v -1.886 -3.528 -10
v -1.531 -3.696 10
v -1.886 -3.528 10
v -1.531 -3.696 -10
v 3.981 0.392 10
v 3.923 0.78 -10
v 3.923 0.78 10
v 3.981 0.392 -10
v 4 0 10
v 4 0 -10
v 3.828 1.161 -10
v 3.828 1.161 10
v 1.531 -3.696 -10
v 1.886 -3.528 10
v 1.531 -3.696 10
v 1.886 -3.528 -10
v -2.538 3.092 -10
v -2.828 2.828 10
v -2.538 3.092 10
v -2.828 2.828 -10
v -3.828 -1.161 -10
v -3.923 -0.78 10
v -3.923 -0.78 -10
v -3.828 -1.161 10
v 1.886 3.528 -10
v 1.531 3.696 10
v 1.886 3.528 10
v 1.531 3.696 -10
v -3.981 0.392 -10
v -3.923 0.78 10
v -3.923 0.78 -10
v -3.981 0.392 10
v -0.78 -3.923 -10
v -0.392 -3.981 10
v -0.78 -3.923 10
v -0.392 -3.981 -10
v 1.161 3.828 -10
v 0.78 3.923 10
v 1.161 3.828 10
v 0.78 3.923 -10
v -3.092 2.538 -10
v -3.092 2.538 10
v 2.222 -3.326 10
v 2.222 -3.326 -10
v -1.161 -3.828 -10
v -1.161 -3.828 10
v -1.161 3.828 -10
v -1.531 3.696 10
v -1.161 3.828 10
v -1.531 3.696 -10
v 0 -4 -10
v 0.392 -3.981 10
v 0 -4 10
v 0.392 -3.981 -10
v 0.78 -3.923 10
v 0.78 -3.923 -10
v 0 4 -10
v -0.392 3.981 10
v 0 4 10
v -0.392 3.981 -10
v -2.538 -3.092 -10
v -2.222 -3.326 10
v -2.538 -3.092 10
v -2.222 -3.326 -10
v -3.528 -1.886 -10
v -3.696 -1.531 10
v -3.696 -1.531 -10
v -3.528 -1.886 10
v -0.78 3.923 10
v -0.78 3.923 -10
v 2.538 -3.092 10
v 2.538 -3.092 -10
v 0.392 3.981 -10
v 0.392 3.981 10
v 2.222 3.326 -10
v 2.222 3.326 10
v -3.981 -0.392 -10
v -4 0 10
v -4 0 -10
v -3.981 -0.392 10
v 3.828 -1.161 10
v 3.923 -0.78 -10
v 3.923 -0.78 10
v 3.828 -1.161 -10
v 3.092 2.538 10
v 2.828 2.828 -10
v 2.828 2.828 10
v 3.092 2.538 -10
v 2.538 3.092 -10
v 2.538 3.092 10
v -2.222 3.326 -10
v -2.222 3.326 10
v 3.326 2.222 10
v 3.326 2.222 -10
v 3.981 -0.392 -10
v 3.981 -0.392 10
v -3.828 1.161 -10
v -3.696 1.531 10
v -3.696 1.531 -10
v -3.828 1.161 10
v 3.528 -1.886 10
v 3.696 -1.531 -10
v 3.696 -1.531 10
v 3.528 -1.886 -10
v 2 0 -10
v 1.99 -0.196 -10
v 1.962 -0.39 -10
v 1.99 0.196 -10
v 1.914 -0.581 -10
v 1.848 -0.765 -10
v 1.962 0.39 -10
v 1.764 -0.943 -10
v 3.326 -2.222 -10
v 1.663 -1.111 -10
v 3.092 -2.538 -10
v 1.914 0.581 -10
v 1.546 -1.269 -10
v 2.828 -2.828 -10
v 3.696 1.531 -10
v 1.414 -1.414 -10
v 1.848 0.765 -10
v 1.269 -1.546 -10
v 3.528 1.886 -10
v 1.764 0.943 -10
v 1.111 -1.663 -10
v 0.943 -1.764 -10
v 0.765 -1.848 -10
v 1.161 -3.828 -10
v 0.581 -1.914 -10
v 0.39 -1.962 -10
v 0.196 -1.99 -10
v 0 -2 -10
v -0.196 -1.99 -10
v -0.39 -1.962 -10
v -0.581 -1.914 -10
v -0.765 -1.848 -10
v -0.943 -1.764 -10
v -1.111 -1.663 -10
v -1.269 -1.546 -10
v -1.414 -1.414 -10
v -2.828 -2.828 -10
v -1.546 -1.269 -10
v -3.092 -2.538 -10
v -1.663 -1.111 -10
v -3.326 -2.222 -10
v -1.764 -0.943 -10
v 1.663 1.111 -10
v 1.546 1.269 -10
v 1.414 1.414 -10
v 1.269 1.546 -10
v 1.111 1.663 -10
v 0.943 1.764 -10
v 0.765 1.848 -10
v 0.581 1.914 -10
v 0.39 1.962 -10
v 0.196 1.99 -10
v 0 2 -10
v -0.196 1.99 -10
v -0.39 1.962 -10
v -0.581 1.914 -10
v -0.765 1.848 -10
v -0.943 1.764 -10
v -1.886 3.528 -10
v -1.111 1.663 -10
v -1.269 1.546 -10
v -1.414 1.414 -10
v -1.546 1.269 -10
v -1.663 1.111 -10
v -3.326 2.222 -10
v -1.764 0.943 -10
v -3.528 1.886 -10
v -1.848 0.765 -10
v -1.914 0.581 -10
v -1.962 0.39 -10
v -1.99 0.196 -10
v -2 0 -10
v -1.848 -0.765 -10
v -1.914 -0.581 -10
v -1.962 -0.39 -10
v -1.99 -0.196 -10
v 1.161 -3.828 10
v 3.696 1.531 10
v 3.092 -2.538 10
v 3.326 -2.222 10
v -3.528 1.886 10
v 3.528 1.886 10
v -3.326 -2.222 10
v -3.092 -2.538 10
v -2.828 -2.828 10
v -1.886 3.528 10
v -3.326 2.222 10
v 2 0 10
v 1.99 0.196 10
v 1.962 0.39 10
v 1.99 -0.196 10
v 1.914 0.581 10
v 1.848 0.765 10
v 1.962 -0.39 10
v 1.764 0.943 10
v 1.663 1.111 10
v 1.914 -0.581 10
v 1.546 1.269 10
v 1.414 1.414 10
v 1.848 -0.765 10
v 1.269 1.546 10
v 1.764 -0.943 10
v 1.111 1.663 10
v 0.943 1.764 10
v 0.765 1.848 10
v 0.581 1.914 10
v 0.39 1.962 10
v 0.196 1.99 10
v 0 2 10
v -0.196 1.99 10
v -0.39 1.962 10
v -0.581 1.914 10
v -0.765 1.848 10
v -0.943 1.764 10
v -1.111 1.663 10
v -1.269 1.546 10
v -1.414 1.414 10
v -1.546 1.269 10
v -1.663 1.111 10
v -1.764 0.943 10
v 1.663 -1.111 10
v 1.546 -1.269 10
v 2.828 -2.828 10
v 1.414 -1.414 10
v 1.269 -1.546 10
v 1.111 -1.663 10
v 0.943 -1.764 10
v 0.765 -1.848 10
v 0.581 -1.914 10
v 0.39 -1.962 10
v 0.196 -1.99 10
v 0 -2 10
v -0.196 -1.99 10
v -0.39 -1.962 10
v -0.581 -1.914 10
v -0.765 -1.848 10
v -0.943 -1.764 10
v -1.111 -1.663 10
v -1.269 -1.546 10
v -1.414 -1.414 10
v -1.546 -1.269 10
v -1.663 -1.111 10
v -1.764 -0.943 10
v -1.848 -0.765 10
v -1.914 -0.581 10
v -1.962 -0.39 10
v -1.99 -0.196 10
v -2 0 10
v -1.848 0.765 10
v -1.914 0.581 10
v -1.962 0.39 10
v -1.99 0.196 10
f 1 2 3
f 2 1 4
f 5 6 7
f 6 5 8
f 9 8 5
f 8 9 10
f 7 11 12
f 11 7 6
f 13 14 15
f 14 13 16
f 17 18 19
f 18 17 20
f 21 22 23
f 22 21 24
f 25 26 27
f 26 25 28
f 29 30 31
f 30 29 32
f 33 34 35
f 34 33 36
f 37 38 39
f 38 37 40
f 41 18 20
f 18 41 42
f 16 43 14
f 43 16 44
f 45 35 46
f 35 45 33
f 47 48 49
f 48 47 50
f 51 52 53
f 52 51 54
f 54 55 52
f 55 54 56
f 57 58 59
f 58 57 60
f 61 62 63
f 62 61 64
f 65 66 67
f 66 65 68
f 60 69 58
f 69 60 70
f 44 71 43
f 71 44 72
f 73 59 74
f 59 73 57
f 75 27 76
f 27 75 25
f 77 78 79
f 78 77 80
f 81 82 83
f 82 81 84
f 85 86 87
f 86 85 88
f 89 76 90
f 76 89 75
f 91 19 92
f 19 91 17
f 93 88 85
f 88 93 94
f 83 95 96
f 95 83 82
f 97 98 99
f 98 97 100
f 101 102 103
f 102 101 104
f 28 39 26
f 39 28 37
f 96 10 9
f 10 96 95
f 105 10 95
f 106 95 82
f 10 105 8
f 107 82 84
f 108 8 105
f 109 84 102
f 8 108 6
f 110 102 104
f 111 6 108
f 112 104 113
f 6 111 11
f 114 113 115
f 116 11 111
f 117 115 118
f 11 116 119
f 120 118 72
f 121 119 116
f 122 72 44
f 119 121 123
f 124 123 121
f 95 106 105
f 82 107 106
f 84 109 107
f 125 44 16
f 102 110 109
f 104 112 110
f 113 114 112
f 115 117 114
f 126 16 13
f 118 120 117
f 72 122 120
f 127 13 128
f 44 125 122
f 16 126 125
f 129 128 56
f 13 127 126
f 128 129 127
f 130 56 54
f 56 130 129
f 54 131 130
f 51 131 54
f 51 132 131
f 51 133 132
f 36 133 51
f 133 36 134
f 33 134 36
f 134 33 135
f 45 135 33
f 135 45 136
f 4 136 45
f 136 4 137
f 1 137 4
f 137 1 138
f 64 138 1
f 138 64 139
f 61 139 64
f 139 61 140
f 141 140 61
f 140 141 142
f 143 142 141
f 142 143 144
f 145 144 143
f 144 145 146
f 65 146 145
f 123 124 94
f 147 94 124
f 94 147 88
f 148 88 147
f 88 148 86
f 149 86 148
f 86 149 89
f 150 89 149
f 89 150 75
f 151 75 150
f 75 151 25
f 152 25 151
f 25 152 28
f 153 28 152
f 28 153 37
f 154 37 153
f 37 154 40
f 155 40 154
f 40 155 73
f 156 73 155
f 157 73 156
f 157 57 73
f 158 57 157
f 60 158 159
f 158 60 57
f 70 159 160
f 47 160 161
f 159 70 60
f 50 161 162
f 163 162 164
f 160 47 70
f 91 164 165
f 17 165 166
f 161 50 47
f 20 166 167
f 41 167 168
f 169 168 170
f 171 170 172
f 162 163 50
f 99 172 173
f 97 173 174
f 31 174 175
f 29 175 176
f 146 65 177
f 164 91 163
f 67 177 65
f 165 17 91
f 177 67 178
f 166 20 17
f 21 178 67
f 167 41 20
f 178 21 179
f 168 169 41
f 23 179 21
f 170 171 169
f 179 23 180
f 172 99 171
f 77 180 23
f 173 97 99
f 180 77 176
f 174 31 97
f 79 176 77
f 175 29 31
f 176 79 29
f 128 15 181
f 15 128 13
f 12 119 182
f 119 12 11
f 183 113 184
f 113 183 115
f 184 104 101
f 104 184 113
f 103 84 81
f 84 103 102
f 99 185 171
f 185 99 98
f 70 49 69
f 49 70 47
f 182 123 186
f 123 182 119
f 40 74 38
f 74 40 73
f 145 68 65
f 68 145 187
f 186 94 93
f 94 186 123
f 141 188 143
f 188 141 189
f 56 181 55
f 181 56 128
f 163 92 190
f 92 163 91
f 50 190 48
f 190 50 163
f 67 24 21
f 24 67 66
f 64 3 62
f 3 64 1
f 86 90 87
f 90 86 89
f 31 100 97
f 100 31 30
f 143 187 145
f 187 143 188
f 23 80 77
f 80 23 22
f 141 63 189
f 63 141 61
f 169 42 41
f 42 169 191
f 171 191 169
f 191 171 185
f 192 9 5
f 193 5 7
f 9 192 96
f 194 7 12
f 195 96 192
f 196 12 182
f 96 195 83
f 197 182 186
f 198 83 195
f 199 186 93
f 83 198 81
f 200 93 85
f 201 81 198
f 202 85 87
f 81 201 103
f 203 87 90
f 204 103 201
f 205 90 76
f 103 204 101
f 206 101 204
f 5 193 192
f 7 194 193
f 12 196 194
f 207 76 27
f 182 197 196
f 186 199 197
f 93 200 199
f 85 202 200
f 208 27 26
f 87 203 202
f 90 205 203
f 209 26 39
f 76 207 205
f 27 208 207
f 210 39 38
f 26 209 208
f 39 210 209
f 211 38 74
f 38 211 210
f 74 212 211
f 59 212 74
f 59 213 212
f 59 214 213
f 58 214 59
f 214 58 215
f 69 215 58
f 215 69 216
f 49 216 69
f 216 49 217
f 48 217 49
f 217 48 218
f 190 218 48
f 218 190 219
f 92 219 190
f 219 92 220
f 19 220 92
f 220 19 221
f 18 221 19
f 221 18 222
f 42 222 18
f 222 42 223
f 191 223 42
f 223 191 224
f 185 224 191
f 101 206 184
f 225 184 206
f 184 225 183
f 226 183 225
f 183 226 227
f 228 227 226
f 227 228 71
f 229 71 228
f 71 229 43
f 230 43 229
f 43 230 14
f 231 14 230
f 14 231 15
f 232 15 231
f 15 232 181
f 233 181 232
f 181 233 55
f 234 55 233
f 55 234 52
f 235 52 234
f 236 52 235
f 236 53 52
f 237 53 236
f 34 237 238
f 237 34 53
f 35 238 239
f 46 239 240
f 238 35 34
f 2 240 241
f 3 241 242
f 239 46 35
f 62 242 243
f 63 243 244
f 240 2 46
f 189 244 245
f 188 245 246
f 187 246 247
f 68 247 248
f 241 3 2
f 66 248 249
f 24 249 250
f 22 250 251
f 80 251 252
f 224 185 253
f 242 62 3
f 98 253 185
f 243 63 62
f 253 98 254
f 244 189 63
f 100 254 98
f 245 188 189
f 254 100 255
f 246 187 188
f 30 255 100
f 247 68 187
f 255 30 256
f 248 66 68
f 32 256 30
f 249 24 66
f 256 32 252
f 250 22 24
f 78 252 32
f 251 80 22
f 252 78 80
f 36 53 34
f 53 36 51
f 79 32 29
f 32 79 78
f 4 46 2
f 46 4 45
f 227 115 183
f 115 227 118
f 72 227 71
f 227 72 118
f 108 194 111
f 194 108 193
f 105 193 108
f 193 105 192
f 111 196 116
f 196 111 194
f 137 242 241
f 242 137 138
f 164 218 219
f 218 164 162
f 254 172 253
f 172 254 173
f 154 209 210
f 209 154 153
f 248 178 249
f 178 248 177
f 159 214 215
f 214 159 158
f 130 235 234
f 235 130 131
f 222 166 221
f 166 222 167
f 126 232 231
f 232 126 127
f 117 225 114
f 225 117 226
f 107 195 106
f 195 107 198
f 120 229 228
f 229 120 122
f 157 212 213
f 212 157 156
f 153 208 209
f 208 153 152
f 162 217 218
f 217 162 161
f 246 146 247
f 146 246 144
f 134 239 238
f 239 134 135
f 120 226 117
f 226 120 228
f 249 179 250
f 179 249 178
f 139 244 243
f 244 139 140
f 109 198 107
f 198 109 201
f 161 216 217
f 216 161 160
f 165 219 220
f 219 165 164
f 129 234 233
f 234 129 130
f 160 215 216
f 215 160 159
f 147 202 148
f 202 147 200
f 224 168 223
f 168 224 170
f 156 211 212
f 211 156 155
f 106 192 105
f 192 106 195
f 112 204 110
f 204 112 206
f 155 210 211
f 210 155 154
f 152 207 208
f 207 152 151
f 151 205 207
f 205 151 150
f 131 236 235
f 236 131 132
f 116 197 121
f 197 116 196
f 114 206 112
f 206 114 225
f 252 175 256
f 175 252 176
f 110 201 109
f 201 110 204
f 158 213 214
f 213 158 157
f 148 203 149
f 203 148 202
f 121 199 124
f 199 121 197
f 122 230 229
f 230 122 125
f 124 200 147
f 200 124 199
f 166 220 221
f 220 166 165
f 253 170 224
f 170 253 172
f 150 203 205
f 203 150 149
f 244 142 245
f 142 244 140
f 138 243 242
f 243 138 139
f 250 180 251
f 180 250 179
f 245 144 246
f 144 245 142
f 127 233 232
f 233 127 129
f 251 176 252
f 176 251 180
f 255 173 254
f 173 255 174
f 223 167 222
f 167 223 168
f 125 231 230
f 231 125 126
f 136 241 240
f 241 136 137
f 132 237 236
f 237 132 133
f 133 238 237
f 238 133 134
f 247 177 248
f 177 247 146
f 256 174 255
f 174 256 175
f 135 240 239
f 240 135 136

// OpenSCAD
$fn=64;

module standoff_pillar(thread_d=4.0, length=20.0, outer_d=8.0) {
    difference() {
        cylinder(h=length, d=outer_d, center=true);
        cylinder(h=length + 0.4, d=thread_d, center=true);
    }
}

standoff_pillar(thread_d=4.0, length=20.0, outer_d=8.0);
